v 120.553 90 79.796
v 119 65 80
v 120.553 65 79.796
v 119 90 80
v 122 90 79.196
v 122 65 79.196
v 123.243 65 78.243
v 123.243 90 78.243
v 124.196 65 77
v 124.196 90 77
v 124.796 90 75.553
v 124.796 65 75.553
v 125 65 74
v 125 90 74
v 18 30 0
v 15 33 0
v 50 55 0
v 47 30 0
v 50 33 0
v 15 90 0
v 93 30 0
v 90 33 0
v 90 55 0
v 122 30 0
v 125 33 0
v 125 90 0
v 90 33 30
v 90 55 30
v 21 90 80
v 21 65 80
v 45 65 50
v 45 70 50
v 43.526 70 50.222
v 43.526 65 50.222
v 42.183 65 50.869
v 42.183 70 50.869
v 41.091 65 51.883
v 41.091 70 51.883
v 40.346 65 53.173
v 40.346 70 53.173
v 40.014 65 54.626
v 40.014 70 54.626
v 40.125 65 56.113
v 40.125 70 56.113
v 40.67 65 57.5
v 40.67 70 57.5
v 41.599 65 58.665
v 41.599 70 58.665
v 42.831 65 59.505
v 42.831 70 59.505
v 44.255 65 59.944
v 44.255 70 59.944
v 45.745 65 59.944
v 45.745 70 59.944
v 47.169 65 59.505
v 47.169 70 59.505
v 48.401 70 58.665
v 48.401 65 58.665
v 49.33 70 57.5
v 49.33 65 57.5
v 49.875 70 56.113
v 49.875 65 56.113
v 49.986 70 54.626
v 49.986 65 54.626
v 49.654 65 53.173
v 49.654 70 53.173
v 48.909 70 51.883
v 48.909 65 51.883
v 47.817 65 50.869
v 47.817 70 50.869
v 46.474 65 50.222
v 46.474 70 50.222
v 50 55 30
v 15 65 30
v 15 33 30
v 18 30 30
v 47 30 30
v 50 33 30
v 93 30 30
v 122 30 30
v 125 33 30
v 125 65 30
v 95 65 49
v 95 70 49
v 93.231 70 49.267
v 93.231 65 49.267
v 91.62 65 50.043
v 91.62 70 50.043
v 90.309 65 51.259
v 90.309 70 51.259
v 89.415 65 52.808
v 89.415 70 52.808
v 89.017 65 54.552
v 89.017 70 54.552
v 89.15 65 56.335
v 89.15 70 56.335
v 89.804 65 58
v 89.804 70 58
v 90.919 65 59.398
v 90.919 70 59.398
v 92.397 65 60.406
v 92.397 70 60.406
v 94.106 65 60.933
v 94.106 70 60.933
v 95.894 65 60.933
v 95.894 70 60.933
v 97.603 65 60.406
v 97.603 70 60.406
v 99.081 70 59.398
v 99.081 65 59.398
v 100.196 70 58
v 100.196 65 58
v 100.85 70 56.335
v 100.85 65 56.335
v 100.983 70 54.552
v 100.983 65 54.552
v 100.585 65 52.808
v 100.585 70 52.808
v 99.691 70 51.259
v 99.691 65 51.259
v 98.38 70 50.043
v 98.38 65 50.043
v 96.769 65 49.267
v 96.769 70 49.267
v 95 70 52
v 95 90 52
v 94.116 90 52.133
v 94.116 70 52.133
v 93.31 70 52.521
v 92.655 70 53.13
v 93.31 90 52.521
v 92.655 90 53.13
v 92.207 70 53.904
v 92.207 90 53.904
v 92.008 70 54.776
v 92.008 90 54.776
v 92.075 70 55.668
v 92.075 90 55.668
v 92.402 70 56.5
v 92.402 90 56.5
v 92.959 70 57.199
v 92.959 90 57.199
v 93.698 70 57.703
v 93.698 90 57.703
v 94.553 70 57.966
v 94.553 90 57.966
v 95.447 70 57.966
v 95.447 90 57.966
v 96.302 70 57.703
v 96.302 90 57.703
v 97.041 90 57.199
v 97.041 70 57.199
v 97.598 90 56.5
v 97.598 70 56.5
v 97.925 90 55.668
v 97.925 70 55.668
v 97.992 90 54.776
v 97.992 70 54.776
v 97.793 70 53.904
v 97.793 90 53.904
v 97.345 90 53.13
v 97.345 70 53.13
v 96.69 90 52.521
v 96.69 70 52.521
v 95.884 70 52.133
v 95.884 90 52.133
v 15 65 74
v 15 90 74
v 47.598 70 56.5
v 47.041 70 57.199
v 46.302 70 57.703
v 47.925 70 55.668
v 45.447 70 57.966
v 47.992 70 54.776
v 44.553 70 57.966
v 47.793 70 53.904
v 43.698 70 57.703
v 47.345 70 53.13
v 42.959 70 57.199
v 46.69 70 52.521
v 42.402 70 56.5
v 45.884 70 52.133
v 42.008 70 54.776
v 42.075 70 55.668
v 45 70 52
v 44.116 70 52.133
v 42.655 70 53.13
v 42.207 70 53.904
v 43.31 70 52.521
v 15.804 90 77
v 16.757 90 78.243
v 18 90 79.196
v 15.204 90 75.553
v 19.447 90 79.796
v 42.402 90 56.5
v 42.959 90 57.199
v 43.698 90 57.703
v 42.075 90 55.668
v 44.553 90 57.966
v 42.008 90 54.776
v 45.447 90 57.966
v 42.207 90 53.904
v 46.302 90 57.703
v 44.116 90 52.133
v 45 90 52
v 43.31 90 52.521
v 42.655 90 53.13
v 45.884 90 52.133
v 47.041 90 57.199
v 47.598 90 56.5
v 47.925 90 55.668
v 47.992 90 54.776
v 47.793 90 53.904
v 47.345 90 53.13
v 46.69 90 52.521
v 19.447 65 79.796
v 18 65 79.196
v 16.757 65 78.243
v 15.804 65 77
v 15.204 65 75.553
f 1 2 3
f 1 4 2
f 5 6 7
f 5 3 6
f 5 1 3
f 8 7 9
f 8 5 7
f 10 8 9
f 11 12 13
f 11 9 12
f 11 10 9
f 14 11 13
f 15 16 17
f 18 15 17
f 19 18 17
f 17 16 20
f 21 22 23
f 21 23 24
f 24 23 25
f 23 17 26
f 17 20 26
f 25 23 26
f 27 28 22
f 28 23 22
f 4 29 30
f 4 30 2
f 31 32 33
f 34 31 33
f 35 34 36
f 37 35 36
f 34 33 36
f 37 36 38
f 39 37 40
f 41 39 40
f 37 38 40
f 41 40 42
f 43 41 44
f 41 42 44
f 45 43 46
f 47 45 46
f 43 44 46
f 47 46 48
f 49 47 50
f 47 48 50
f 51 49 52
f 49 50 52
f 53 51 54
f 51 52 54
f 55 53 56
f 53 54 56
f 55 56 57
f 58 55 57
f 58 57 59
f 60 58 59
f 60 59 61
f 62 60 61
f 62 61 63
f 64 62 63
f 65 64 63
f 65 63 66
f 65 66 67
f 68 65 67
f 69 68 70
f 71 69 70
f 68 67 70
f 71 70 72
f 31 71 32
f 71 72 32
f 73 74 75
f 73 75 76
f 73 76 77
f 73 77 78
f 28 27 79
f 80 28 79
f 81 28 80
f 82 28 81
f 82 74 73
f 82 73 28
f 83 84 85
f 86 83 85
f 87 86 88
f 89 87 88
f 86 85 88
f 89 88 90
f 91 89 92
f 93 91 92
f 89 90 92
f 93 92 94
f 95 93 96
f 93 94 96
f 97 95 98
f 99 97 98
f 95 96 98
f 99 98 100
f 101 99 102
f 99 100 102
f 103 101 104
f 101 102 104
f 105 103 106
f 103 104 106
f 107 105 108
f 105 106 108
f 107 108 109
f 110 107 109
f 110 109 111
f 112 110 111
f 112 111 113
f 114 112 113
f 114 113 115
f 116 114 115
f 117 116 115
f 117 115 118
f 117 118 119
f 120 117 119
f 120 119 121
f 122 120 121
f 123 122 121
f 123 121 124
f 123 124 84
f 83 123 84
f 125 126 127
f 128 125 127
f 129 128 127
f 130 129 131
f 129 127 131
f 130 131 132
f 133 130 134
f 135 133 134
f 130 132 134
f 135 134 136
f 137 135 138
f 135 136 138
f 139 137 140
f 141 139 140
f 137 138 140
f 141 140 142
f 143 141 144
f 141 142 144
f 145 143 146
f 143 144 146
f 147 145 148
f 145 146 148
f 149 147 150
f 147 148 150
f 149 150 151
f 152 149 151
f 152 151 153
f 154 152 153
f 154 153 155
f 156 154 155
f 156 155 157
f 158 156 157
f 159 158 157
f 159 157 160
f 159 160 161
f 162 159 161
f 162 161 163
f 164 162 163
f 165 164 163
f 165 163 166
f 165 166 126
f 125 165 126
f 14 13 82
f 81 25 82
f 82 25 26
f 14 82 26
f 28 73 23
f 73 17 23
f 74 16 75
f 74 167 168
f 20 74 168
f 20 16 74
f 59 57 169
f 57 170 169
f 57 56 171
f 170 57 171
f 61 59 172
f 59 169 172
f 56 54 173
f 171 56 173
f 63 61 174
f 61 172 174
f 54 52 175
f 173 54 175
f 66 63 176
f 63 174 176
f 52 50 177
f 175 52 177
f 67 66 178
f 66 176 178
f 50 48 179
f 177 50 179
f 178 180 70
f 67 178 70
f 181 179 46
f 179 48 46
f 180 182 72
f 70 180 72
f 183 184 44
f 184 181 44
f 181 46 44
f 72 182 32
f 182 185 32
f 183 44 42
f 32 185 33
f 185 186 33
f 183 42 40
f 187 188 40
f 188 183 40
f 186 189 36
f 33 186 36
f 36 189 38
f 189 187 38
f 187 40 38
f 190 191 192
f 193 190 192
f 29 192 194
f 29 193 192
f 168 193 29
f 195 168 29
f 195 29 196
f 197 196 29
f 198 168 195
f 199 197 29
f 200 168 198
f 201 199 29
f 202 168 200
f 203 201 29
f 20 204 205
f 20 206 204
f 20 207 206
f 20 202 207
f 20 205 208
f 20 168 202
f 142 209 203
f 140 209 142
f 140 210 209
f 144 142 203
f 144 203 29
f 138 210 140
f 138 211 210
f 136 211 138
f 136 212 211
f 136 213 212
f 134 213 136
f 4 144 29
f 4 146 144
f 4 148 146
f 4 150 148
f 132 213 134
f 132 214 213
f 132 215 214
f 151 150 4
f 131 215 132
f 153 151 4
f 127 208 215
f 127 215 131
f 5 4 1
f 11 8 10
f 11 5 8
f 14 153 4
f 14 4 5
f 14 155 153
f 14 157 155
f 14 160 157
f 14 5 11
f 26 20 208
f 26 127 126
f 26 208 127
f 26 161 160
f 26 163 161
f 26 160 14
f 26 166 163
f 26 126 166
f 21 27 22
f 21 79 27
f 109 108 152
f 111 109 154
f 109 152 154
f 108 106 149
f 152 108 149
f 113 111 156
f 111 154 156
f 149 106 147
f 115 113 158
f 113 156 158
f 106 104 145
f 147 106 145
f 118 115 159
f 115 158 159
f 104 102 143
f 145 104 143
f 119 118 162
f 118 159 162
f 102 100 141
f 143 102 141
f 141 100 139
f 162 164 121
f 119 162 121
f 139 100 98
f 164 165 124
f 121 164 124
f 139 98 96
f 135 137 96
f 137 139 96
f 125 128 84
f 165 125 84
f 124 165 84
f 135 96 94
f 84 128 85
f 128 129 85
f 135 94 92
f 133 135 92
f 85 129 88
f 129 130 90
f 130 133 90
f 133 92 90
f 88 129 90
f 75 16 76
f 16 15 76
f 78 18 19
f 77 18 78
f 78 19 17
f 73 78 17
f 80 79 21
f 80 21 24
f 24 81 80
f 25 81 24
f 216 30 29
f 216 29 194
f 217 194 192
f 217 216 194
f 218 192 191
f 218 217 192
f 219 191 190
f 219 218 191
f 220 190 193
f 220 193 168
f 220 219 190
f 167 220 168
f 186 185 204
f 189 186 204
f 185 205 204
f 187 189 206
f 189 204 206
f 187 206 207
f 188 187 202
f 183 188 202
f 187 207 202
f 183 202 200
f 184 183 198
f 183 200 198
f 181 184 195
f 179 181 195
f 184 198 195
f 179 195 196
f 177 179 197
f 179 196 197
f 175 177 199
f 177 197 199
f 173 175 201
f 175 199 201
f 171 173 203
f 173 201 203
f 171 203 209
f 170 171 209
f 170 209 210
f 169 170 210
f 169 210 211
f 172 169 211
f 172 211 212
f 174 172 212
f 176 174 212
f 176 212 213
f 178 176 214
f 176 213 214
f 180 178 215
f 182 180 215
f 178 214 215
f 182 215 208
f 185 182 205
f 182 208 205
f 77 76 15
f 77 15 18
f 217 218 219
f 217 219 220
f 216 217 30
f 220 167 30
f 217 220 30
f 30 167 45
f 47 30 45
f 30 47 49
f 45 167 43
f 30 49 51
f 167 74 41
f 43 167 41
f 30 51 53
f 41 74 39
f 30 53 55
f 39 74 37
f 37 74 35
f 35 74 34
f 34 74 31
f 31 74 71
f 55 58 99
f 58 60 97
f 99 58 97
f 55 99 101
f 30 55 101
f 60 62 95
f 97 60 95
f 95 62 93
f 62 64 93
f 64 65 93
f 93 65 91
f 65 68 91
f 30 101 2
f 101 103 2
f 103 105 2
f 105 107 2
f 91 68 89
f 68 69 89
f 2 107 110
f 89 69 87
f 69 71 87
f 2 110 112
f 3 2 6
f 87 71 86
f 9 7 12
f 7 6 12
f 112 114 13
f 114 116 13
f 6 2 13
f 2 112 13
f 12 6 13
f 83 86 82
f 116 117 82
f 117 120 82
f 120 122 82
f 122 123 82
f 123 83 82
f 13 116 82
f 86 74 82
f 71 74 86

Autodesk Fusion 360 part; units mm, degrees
sketch "Sketch1" plane through (0, 0, 0) normal (0, 0, 1) x (1, 0, 0)
  line L0 (15, 30) -> (50, 30)
  line L1 (50, 30) -> (50, 55)
  line L2 (50, 55) -> (90, 55)
  line L3 (90, 55) -> (90, 30)
  line L4 (90, 30) -> (125, 30)
  line L5 (15, 30) -> (15, 90)
  line L6 (125, 30) -> (125, 90)
  line L7 (15, 90) -> (125, 90)
  dimension "d6" = 60
extrude "Extrude1" add sketch "Sketch1" along normal blind 30 makes body 1
chamfer "Chamfer1" distance 3 angle 45 1 edges at (50, 30, 15) on bodies 1
chamfer "Chamfer2" distance 3 angle 45 1 edges at (90, 30, 15) on bodies 1
chamfer "Chamfer3" distance 3 angle 45 1 edges at (125, 30, 15) on bodies 1
chamfer "Chamfer4" distance 3 angle 45 1 edges at (15, 30, 15) on bodies 1
sketch "Sketch2" plane through (0, 0, 0) normal (0, 0, 1) x (1, 0, 0)
  line L0 (15, 90) -> (15, 65)
  line L1 (15, 65) -> (125, 65)
  line L2 (125, 65) -> (125, 90)
  line L3 (125, 90) -> (15, 90)
extrude "Extrude2" add sketch "Sketch2" along normal blind 80 separate body makes body 2
combine "Combine1" operation add target body 1 tool bodies 2
fillet "Fillet1" radius 6 1 edges at (125, 77.5, 80) on bodies 1
fillet "Fillet2" radius 6 1 edges at (15, 77.5, 80) on bodies 1
sketch "Sketch3" plane through (0, 0, 0) normal (0, 1, 0) x (1, 0, 0)
hole "Hole1" at (45, 65, 55) direction (0, 1, 0) diameter 6 depth 25 tip angle 180 counterbore diameter 10 counterbore depth 5 bodies 1
hole "Hole2" at (95, 65, 55) direction (0, 1, 0) diameter 6 depth 25 tip angle 180 counterbore diameter 12 counterbore depth 5 bodies 1
